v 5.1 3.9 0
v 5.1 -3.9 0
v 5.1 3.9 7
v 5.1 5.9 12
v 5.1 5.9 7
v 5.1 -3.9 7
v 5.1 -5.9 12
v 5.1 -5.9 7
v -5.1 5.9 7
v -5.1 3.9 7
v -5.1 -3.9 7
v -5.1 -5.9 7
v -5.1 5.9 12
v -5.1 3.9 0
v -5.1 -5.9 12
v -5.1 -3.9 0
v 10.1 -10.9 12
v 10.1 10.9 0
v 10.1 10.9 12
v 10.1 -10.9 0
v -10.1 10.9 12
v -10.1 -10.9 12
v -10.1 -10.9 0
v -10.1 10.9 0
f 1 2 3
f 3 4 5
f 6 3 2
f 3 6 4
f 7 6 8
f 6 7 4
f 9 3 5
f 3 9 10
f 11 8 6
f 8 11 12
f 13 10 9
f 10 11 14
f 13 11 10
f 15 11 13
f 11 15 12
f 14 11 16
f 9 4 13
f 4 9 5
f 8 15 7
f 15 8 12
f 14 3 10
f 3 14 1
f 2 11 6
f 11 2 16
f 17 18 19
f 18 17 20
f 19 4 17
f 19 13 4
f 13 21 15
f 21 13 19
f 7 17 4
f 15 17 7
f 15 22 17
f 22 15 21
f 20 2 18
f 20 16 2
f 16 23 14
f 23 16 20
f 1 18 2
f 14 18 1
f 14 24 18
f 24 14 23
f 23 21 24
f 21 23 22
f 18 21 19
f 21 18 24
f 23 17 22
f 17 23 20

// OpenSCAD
// file: ../vehicle/barrel.scad
// IR gun barrel: thick-wall tube, LED seated coaxially at the rear, held by a rear cap.
// Modeled in print orientation: axis on Z, muzzle on the bed at z = 0, rear at z = len.
// The LED goes in from the rear, its flange stops on a step, and the cap presses it there.

include <../lib/common.scad>
include <../lib/parts.scad>

barrel_len = 60;
barrel_bore_d = 5.0;
barrel_od = 14;
barrel_cap_d = 9;
barrel_cap_h = 3;
barrel_wire_slot = [4.0, 2.0];

function barrel_od() = barrel_od;

// Longer than the LED body so the flange, not the dome, is the stop.
led_seat_len = led_h - led_flange_h + 0.5;

module barrel(len = barrel_len, bore_d = barrel_bore_d, od = barrel_od, seat_cl = clearance) {
    assert(od - barrel_cap_d >= 2 * wall_min, "barrel wall around the cap is too thin");
    assert(len > barrel_cap_h + led_flange_h + led_seat_len + 5, "barrel too short for the LED seat");
    difference() {
        cylinder(d = od, h = len);
        barrel_bore(len, bore_d, seat_cl);
    }
}

// Kept separate so baffles or a muzzle aperture can be added here later.
module barrel_bore(len, bore_d, seat_cl) {
    flange_z = len - barrel_cap_h - led_flange_h;
    hole(bore_d, len, cl = 0);
    translate([0, 0, flange_z - led_seat_len]) cylinder(d = led_d + seat_cl, h = led_seat_len + eps);
    translate([0, 0, flange_z]) cylinder(d = led_flange_d + seat_cl, h = led_flange_h + eps);
    translate([0, 0, len - barrel_cap_h]) cylinder(d = barrel_cap_d + clearance, h = barrel_cap_h + eps);
}

// Printed flat side down; that face presses on the LED flange.
module barrel_cap() {
    difference() {
        cylinder(d = barrel_cap_d, h = barrel_cap_h);
        translate([0, 0, barrel_cap_h / 2])
            cube([barrel_wire_slot.x, barrel_wire_slot.y, barrel_cap_h + 1], center = true);
    }
}

barrel();
translate([barrel_od + 5, 0, 0]) barrel_cap();
// file: ../vehicle/gun_block.scad
// Gun block: raked block with the barrel bore, the TSOP pair seat on top and the wall
// as its rear part. Modeled in assembly orientation: x = 0 on the barrel axis, y = 0
// at the wall rear face, z = 0 on the base plate top. Printed on the wall rear face,
// so the barrel bore is vertical and round.
// The barrel slides in from the front until its rear end is flush with the wall rear
// face (press the block rear on the table). It is held by friction (barrel_fit_cl).

include <../lib/common.scad>
include <../lib/parts.scad>
use <barrel.scad>

block_w = 30;
block_h = 40;
// Flat top for the TSOP pair, from the wall rear face; the front face leans back by block_rake.
block_top_len = 20;
block_rake = 30;
// Wall: full plate width, sides sloping down to wall_side_h.
wall_w = 100;
wall_t = 4;
wall_side_h = 15;
// Foot on the plate for the M2.5 screws; nuts go under the base plate.
flange_t = 3;
flange_len = 12;
flange_front_w = 84;
flange_hole_x = [25, 40];
flange_hole_y = 8;
barrel_axis_z = 15;
barrel_fit_cl = 0.2;
tsop = tsop1730;
tsop_seat_depth = 5;
// Under the lens ends of the pair; the bodies rest on it, the legs go down between.
tsop_ledge = 2;
// [width, height] of the wire channel from the TSOP legs out of the wall rear face.
tsop_wire_channel = [6, 5];
// Dome radius is 2.75; the whole lens must stay above the block top.
min_lens_above_top = 3.5;

block_len = block_top_len + block_h * tan(block_rake);
bore_d = barrel_od() + barrel_fit_cl;
tsop_y = block_top_len / 2;
tsop_floor_z = block_h - tsop_seat_depth;
wire_z = barrel_axis_z + bore_d / 2 + wall_min;

function gun_block_len() = block_len;
function gun_block_wall_w() = wall_w;
function gun_block_wall_t() = wall_t;
function gun_block_barrel_z() = barrel_axis_z;
function gun_block_tsop_seat() = [0, tsop_y, tsop_floor_z];
function gun_block_holes() = [for (sx = [-1, 1], x = flange_hole_x) [sx * x, flange_hole_y]];

assert(tsop_lens_h(tsop) - tsop_seat_depth >= min_lens_above_top, "TSOP seat too deep, lens would be covered");
assert(tsop_y + (2 * tsop_depth(tsop) + clearance) / 2 + wall_min <= block_top_len, "TSOP pocket does not fit the flat top");
assert(bore_d + 2 * wall_min <= block_w, "block too narrow for the barrel");
assert(barrel_axis_z - bore_d / 2 >= wall_min, "barrel bore too low");
assert(wire_z + tsop_wire_channel.y <= tsop_floor_z - wall_min, "no room for the TSOP wires above the barrel");
echo(block_len = block_len, tsop_legs_max = tsop_floor_z - wire_z, lens_above_top = tsop_lens_h(tsop) - tsop_seat_depth);

// Top face at z = 0, pair centred on the origin, legs straight down into the cavity.
module tsop_seat_cut(t = tsop, depth = tsop_seat_depth, cavity_h = 10, ledge = tsop_ledge) {
    pocket = [tsop_w(t) + clearance, 2 * tsop_depth(t) + clearance];
    cavity = [pocket.x, pocket.y - 2 * ledge];
    assert(tsop_pin_back(t) + 0.5 <= cavity.y / 2, "ledge covers the legs");
    translate([-pocket.x / 2, -pocket.y / 2, -depth]) cube([pocket.x, pocket.y, depth + eps]);
    translate([-cavity.x / 2, -cavity.y / 2, -depth - cavity_h]) cube([cavity.x, cavity.y, cavity_h + eps]);
}

module gun_block() {
    difference() {
        union() {
            hull() {
                translate([-block_w / 2, 0, 0]) cube([block_w, block_len, eps]);
                translate([-block_w / 2, 0, block_h - eps]) cube([block_w, block_top_len, eps]);
            }
            translate([0, wall_t, 0]) rotate([90, 0, 0]) linear_extrude(wall_t) polygon([
                [-wall_w / 2, 0], [wall_w / 2, 0], [wall_w / 2, wall_side_h],
                [block_w / 2, block_h], [-block_w / 2, block_h], [-wall_w / 2, wall_side_h],
            ]);
            linear_extrude(flange_t) polygon([
                [-wall_w / 2, 0], [wall_w / 2, 0], [wall_w / 2, wall_t],
                [flange_front_w / 2, flange_len], [-flange_front_w / 2, flange_len], [-wall_w / 2, wall_t],
            ]);
        }
        translate([0, -eps, barrel_axis_z]) rotate([-90, 0, 0]) cylinder(d = bore_d, h = block_len + 2 * eps);
        translate([0, tsop_y, block_h]) tsop_seat_cut(cavity_h = tsop_floor_z - wire_z);
        translate([-tsop_wire_channel.x / 2, -eps, wire_z]) cube([tsop_wire_channel.x, tsop_y + eps, tsop_wire_channel.y]);
        // Teardrop tip points +Y, which is up when printed on the wall rear face.
        for (sx = [-1, 1], x = flange_hole_x)
            translate([sx * x, flange_hole_y, flange_t]) rotate([-90, 0, 0]) teardrop(m25_d, flange_t);
    }
}

rotate([90, 0, 0]) gun_block();
// file: ../lib/parts.scad
// Off-the-shelf part sizes and simple ghost models for previews. Units mm.
// docs/measurements.md is the source of truth for every value here, with its source
// and status. Change both together. "unverified" values are not final.

// Mounted with the long axis horizontal and the 22.3 width vertical.
// Local frame of tt_motor_ghost(): shaft on the X axis, gearbox end towards -Y.
tt_len = 64.4;
tt_w = 22.3;
tt_clip_w = 22.6;
tt_t = 18.7;
tt_shaft_from_end = 11.0;
tt_shaft_d = 5.4;
tt_shaft_len = 9.1;
tt_boss_d = 5.5;
tt_hole_d = 2.8;
// [along length from shaft, across width from shaft]
tt_holes = [[20.1, 8.85], [20.1, -8.85], [-13.4, 0]];
tt_tab_len = 5.0;
tt_tab_w = 5.7;
// Round peg on the gearbox side, estimated from the drawing scale.
tt_peg = [11.2, 0];
tt_peg_d = 4.0;
tt_top_above_axle = max(tt_w, tt_clip_w) / 2;

wheel_d = 65;
wheel_w = 26;

caster_h = 35;
caster_wheel_d = 25;
caster_hole_d = 5;
caster_hole_spacing = [28, 23];
caster_plate = [38, 32];
caster_plate_t = 2;

// Plate underside height; the caster must reach the same height. Recompute after
// measuring wheel_d, tt_top_above_axle, motor_top_gap and caster_h.
// On the prototype an aluminium angle flange sits between plate and motor (photo
// estimate). The gap also keeps the top motor nut trap clear of the plate.
motor_top_gap = 2;
plate_underside_h = wheel_d / 2 + tt_top_above_axle + motor_top_gap;
caster_spacer_h = plate_underside_h - caster_h;

led_d = 5.0;
led_flange_d = 5.8;
led_flange_h = 1.0;
led_h = 8.6;
led_lead_pitch = 2.54;

// IR receivers: [body w, body h, depth incl. lens, lens centre above body bottom,
//     outer pin spacing, pins from back face]
tsop1730 = [10.0, 12.5, 5.8, 9.2, 7.62, 1.4];
// Upgrade option only (docs/hardware-upgrades.md). Lens height and pin offset are guesses.
tsop38238 = [5.0, 6.95, 4.8, 4.5, 5.08, 1.0];
function tsop_w(t) = t[0];
function tsop_h(t) = t[1];
function tsop_depth(t) = t[2];
function tsop_lens_h(t) = t[3];
function tsop_pin_span(t) = t[4];
function tsop_pin_back(t) = t[5];

btn_hole_d = 24;
btn_bezel_d = 30;
btn_above_panel = 10;
btn_depth = 33;
btn_nut_d = 30;

switch_body = [8.6, 3.6, 3.5];
switch_lever = [2.0, 2.0, 4.0];
switch_travel = 2.0;

cell_d = 18.5;
cell_len = 65.2;

joystick_cap_top = 32;
joystick_cap_d = 25;

// Height above the PCB top per Eagle package, for previews and clearance.
pcb_part_heights = [
    ["KEYSTONE_1049_DUAL_18650_HOLDER", 20],
    ["SINGLE_18650_HOLDER", 20],
    ["NRF24L01+", 13],
    ["NANO", 11],
    ["BA56-12EWA", 8],
    ["DIL14", 7],
    ["DIL16", 7],
    ["F/CM12P", 9.5],
    ["JOYSTICK-2AXIS-BUTTON", 17],
    ["DC-DC-STEP-UP-5V", 7],
    ["TL3XPO", 3.5],
];
function pcb_part_height(package) =
    let(i = search([package], pcb_part_heights)[0])
    is_num(i) ? pcb_part_heights[i][1] : 3;

module tt_motor_ghost() {
    color("gold") {
        translate([-tt_t / 2, -tt_shaft_from_end, -tt_w / 2]) cube([tt_t, tt_len, tt_w]);
        translate([0, -tt_shaft_from_end - tt_tab_len, 0])
            cube([3, 2 * tt_tab_len, tt_tab_w], center = true);
    }
    color("white") rotate([0, 90, 0])
        cylinder(d = tt_shaft_d, h = tt_t + 2 * tt_shaft_len, center = true);
}

module wheel_ghost() {
    color("dimgray") rotate([0, 90, 0]) cylinder(d = wheel_d, h = wheel_w, center = true);
}

// Top of the mounting plate at z = 0, wheel on the ground at z = -caster_h.
module caster_ghost() {
    color("white") {
        translate([0, 0, -caster_plate_t / 2]) cube([caster_plate.x, caster_plate.y, caster_plate_t], center = true);
        translate([0, 0, -caster_h + caster_wheel_d / 2]) rotate([0, 90, 0])
            cylinder(d = caster_wheel_d, h = 10, center = true);
        translate([-8, -4, -caster_h + caster_wheel_d / 2]) cube([16, 8, caster_h - caster_wheel_d / 2]);
    }
}

// Body bottom at z = 0, lens facing +Y.
module tsop_ghost(t = tsop1730) {
    color("black") translate([-tsop_w(t) / 2, 0, 0]) cube([tsop_w(t), tsop_depth(t), tsop_h(t)]);
    color("red") translate([0, tsop_depth(t), tsop_lens_h(t)]) sphere(1);
}

// Two receivers glued back to back, as on the prototype: one lens +Y, one -Y.
module tsop_pair_ghost(t = tsop1730) {
    tsop_ghost(t);
    rotate([0, 0, 180]) tsop_ghost(t);
}

// Flange bottom at z = 0, pointing +Z.
module led_ghost() {
    color("lightblue") {
        cylinder(d = led_flange_d, h = led_flange_h);
        cylinder(d = led_d, h = led_h - led_d / 2);
        translate([0, 0, led_h - led_d / 2]) sphere(d = led_d);
    }
}

// Panel front face at z = 0, button pointing +Z.
module arcade_button_ghost() {
    color("crimson") cylinder(d = btn_bezel_d, h = btn_above_panel);
    color("gray") translate([0, 0, -btn_depth]) cylinder(d = btn_hole_d - 1, h = btn_depth);
}

// PCB from a generated pcb_*.scad table with footprint boxes as part ghosts.
// Bottom of the PCB at z = 0. Parts named in flat_parts are only wire connection
// points on this PCB (the real part sits elsewhere) and are drawn flat.
module pcb_ghost(outline, holes, parts, flat_parts = []) {
    color("darkgreen") difference() {
        linear_extrude(pcb_thickness) polygon(outline);
        for (h = holes) translate([h[1], h[2], 0]) hole(h[3], pcb_thickness, cl = 0);
    }
    for (p = parts) {
        box = p[7];
        h = is_num(search([p[0]], flat_parts)[0]) ? 0.3 : pcb_part_height(p[1]);
        color(h > 15 ? "black" : "steelblue", 0.8)
            translate([box[0], box[1], pcb_thickness]) cube([box[2] - box[0], box[3] - box[1], h]);
    }
}
// file: ../lib/common.scad
// Shared print, fastener and helper definitions. Units mm.

$fa = 4;
$fs = 0.3;

eps = 0.01;

// Added to the diameter of holes, seats and press fits. Tune after the test prints.
clearance = 0.2;
wall_min = 1.6;
layer_h = 0.2;
bed_size = [180, 180, 180];

pcb_thickness = 1.6;
base_plate_t = 3;
// Under the PCB for through-hole leads and solder. Set from the vehicle PCB, see docs/measurements.md.
pcb_standoff_h = 2;

// ISO 4032 nuts, nominal.
m25_d = 2.5;
m25_nut_af = 5.0;
m25_nut_h = 2.0;

label_font = "Liberation Sans:style=Bold";

// Vertical hole from z = 0 to z = h.
module hole(d, h, cl = clearance) {
    translate([0, 0, -eps]) cylinder(d = d + cl, h = h + 2 * eps);
}

// Hex pocket from z = 0 to z = h, two flats parallel to X.
module nut_trap(af, h, cl = clearance) {
    translate([0, 0, -eps]) rotate([0, 0, 30])
        cylinder(d = (af + cl) / cos(30), h = h + eps, $fn = 6);
}

// Hole along +Y from y = 0 to y = h with a 45 deg roof pointing +Z,
// so it prints without support when the part's +Z is up on the printer.
module teardrop(d, h, cl = clearance) {
    r = (d + cl) / 2;
    rotate([90, 0, 0]) translate([0, 0, -h - eps])
        linear_extrude(h + 2 * eps) hull() {
            circle(r);
            translate([0, r * sqrt(2) - eps]) square(2 * eps, center = true);
        }
}

// Engraved label, top face at z = 0.
module label(txt, size = 4, depth = 0.6) {
    translate([0, 0, -depth]) linear_extrude(depth + eps)
        text(txt, size = size, font = label_font, halign = "center", valign = "center");
}

// Row from the generated pcb_*.scad parts table by element name.
function pcb_part(parts, name) = parts[search([name], parts)[0]];
// main file
// Seat for the two IR receivers glued back to back, as on the prototype: one lens
// faces +Y, one -Y. Same seat as vehicle/gun_block.scad: the pair sinks into a pocket,
// the bodies rest on two ledges, the legs go straight down. Set tsop = tsop38238 to test
// the upgrade receiver.

include <../lib/common.scad>
include <../lib/parts.scad>
use <../vehicle/gun_block.scad>

tsop = tsop1730;
seat_depth = 5;
block_h = 12;
// Dome radius is 2.75; the whole lens must stay above the block top.
min_lens_above_top = 3.5;

pocket = [tsop_w(tsop) + clearance, 2 * tsop_depth(tsop) + clearance, seat_depth];
block = [pocket.x + 10, pocket.y + 10, block_h];

assert(tsop_lens_h(tsop) - seat_depth >= min_lens_above_top, "seat too deep, lens would be covered");
echo(lens_above_block_top = tsop_lens_h(tsop) - seat_depth);

difference() {
    translate([-block.x / 2, -block.y / 2, 0]) cube(block);
    translate([0, 0, block.z]) tsop_seat_cut(tsop, seat_depth, block.z - seat_depth + eps);
}

%translate([0, 0, block_h - seat_depth]) tsop_pair_ghost(tsop);
